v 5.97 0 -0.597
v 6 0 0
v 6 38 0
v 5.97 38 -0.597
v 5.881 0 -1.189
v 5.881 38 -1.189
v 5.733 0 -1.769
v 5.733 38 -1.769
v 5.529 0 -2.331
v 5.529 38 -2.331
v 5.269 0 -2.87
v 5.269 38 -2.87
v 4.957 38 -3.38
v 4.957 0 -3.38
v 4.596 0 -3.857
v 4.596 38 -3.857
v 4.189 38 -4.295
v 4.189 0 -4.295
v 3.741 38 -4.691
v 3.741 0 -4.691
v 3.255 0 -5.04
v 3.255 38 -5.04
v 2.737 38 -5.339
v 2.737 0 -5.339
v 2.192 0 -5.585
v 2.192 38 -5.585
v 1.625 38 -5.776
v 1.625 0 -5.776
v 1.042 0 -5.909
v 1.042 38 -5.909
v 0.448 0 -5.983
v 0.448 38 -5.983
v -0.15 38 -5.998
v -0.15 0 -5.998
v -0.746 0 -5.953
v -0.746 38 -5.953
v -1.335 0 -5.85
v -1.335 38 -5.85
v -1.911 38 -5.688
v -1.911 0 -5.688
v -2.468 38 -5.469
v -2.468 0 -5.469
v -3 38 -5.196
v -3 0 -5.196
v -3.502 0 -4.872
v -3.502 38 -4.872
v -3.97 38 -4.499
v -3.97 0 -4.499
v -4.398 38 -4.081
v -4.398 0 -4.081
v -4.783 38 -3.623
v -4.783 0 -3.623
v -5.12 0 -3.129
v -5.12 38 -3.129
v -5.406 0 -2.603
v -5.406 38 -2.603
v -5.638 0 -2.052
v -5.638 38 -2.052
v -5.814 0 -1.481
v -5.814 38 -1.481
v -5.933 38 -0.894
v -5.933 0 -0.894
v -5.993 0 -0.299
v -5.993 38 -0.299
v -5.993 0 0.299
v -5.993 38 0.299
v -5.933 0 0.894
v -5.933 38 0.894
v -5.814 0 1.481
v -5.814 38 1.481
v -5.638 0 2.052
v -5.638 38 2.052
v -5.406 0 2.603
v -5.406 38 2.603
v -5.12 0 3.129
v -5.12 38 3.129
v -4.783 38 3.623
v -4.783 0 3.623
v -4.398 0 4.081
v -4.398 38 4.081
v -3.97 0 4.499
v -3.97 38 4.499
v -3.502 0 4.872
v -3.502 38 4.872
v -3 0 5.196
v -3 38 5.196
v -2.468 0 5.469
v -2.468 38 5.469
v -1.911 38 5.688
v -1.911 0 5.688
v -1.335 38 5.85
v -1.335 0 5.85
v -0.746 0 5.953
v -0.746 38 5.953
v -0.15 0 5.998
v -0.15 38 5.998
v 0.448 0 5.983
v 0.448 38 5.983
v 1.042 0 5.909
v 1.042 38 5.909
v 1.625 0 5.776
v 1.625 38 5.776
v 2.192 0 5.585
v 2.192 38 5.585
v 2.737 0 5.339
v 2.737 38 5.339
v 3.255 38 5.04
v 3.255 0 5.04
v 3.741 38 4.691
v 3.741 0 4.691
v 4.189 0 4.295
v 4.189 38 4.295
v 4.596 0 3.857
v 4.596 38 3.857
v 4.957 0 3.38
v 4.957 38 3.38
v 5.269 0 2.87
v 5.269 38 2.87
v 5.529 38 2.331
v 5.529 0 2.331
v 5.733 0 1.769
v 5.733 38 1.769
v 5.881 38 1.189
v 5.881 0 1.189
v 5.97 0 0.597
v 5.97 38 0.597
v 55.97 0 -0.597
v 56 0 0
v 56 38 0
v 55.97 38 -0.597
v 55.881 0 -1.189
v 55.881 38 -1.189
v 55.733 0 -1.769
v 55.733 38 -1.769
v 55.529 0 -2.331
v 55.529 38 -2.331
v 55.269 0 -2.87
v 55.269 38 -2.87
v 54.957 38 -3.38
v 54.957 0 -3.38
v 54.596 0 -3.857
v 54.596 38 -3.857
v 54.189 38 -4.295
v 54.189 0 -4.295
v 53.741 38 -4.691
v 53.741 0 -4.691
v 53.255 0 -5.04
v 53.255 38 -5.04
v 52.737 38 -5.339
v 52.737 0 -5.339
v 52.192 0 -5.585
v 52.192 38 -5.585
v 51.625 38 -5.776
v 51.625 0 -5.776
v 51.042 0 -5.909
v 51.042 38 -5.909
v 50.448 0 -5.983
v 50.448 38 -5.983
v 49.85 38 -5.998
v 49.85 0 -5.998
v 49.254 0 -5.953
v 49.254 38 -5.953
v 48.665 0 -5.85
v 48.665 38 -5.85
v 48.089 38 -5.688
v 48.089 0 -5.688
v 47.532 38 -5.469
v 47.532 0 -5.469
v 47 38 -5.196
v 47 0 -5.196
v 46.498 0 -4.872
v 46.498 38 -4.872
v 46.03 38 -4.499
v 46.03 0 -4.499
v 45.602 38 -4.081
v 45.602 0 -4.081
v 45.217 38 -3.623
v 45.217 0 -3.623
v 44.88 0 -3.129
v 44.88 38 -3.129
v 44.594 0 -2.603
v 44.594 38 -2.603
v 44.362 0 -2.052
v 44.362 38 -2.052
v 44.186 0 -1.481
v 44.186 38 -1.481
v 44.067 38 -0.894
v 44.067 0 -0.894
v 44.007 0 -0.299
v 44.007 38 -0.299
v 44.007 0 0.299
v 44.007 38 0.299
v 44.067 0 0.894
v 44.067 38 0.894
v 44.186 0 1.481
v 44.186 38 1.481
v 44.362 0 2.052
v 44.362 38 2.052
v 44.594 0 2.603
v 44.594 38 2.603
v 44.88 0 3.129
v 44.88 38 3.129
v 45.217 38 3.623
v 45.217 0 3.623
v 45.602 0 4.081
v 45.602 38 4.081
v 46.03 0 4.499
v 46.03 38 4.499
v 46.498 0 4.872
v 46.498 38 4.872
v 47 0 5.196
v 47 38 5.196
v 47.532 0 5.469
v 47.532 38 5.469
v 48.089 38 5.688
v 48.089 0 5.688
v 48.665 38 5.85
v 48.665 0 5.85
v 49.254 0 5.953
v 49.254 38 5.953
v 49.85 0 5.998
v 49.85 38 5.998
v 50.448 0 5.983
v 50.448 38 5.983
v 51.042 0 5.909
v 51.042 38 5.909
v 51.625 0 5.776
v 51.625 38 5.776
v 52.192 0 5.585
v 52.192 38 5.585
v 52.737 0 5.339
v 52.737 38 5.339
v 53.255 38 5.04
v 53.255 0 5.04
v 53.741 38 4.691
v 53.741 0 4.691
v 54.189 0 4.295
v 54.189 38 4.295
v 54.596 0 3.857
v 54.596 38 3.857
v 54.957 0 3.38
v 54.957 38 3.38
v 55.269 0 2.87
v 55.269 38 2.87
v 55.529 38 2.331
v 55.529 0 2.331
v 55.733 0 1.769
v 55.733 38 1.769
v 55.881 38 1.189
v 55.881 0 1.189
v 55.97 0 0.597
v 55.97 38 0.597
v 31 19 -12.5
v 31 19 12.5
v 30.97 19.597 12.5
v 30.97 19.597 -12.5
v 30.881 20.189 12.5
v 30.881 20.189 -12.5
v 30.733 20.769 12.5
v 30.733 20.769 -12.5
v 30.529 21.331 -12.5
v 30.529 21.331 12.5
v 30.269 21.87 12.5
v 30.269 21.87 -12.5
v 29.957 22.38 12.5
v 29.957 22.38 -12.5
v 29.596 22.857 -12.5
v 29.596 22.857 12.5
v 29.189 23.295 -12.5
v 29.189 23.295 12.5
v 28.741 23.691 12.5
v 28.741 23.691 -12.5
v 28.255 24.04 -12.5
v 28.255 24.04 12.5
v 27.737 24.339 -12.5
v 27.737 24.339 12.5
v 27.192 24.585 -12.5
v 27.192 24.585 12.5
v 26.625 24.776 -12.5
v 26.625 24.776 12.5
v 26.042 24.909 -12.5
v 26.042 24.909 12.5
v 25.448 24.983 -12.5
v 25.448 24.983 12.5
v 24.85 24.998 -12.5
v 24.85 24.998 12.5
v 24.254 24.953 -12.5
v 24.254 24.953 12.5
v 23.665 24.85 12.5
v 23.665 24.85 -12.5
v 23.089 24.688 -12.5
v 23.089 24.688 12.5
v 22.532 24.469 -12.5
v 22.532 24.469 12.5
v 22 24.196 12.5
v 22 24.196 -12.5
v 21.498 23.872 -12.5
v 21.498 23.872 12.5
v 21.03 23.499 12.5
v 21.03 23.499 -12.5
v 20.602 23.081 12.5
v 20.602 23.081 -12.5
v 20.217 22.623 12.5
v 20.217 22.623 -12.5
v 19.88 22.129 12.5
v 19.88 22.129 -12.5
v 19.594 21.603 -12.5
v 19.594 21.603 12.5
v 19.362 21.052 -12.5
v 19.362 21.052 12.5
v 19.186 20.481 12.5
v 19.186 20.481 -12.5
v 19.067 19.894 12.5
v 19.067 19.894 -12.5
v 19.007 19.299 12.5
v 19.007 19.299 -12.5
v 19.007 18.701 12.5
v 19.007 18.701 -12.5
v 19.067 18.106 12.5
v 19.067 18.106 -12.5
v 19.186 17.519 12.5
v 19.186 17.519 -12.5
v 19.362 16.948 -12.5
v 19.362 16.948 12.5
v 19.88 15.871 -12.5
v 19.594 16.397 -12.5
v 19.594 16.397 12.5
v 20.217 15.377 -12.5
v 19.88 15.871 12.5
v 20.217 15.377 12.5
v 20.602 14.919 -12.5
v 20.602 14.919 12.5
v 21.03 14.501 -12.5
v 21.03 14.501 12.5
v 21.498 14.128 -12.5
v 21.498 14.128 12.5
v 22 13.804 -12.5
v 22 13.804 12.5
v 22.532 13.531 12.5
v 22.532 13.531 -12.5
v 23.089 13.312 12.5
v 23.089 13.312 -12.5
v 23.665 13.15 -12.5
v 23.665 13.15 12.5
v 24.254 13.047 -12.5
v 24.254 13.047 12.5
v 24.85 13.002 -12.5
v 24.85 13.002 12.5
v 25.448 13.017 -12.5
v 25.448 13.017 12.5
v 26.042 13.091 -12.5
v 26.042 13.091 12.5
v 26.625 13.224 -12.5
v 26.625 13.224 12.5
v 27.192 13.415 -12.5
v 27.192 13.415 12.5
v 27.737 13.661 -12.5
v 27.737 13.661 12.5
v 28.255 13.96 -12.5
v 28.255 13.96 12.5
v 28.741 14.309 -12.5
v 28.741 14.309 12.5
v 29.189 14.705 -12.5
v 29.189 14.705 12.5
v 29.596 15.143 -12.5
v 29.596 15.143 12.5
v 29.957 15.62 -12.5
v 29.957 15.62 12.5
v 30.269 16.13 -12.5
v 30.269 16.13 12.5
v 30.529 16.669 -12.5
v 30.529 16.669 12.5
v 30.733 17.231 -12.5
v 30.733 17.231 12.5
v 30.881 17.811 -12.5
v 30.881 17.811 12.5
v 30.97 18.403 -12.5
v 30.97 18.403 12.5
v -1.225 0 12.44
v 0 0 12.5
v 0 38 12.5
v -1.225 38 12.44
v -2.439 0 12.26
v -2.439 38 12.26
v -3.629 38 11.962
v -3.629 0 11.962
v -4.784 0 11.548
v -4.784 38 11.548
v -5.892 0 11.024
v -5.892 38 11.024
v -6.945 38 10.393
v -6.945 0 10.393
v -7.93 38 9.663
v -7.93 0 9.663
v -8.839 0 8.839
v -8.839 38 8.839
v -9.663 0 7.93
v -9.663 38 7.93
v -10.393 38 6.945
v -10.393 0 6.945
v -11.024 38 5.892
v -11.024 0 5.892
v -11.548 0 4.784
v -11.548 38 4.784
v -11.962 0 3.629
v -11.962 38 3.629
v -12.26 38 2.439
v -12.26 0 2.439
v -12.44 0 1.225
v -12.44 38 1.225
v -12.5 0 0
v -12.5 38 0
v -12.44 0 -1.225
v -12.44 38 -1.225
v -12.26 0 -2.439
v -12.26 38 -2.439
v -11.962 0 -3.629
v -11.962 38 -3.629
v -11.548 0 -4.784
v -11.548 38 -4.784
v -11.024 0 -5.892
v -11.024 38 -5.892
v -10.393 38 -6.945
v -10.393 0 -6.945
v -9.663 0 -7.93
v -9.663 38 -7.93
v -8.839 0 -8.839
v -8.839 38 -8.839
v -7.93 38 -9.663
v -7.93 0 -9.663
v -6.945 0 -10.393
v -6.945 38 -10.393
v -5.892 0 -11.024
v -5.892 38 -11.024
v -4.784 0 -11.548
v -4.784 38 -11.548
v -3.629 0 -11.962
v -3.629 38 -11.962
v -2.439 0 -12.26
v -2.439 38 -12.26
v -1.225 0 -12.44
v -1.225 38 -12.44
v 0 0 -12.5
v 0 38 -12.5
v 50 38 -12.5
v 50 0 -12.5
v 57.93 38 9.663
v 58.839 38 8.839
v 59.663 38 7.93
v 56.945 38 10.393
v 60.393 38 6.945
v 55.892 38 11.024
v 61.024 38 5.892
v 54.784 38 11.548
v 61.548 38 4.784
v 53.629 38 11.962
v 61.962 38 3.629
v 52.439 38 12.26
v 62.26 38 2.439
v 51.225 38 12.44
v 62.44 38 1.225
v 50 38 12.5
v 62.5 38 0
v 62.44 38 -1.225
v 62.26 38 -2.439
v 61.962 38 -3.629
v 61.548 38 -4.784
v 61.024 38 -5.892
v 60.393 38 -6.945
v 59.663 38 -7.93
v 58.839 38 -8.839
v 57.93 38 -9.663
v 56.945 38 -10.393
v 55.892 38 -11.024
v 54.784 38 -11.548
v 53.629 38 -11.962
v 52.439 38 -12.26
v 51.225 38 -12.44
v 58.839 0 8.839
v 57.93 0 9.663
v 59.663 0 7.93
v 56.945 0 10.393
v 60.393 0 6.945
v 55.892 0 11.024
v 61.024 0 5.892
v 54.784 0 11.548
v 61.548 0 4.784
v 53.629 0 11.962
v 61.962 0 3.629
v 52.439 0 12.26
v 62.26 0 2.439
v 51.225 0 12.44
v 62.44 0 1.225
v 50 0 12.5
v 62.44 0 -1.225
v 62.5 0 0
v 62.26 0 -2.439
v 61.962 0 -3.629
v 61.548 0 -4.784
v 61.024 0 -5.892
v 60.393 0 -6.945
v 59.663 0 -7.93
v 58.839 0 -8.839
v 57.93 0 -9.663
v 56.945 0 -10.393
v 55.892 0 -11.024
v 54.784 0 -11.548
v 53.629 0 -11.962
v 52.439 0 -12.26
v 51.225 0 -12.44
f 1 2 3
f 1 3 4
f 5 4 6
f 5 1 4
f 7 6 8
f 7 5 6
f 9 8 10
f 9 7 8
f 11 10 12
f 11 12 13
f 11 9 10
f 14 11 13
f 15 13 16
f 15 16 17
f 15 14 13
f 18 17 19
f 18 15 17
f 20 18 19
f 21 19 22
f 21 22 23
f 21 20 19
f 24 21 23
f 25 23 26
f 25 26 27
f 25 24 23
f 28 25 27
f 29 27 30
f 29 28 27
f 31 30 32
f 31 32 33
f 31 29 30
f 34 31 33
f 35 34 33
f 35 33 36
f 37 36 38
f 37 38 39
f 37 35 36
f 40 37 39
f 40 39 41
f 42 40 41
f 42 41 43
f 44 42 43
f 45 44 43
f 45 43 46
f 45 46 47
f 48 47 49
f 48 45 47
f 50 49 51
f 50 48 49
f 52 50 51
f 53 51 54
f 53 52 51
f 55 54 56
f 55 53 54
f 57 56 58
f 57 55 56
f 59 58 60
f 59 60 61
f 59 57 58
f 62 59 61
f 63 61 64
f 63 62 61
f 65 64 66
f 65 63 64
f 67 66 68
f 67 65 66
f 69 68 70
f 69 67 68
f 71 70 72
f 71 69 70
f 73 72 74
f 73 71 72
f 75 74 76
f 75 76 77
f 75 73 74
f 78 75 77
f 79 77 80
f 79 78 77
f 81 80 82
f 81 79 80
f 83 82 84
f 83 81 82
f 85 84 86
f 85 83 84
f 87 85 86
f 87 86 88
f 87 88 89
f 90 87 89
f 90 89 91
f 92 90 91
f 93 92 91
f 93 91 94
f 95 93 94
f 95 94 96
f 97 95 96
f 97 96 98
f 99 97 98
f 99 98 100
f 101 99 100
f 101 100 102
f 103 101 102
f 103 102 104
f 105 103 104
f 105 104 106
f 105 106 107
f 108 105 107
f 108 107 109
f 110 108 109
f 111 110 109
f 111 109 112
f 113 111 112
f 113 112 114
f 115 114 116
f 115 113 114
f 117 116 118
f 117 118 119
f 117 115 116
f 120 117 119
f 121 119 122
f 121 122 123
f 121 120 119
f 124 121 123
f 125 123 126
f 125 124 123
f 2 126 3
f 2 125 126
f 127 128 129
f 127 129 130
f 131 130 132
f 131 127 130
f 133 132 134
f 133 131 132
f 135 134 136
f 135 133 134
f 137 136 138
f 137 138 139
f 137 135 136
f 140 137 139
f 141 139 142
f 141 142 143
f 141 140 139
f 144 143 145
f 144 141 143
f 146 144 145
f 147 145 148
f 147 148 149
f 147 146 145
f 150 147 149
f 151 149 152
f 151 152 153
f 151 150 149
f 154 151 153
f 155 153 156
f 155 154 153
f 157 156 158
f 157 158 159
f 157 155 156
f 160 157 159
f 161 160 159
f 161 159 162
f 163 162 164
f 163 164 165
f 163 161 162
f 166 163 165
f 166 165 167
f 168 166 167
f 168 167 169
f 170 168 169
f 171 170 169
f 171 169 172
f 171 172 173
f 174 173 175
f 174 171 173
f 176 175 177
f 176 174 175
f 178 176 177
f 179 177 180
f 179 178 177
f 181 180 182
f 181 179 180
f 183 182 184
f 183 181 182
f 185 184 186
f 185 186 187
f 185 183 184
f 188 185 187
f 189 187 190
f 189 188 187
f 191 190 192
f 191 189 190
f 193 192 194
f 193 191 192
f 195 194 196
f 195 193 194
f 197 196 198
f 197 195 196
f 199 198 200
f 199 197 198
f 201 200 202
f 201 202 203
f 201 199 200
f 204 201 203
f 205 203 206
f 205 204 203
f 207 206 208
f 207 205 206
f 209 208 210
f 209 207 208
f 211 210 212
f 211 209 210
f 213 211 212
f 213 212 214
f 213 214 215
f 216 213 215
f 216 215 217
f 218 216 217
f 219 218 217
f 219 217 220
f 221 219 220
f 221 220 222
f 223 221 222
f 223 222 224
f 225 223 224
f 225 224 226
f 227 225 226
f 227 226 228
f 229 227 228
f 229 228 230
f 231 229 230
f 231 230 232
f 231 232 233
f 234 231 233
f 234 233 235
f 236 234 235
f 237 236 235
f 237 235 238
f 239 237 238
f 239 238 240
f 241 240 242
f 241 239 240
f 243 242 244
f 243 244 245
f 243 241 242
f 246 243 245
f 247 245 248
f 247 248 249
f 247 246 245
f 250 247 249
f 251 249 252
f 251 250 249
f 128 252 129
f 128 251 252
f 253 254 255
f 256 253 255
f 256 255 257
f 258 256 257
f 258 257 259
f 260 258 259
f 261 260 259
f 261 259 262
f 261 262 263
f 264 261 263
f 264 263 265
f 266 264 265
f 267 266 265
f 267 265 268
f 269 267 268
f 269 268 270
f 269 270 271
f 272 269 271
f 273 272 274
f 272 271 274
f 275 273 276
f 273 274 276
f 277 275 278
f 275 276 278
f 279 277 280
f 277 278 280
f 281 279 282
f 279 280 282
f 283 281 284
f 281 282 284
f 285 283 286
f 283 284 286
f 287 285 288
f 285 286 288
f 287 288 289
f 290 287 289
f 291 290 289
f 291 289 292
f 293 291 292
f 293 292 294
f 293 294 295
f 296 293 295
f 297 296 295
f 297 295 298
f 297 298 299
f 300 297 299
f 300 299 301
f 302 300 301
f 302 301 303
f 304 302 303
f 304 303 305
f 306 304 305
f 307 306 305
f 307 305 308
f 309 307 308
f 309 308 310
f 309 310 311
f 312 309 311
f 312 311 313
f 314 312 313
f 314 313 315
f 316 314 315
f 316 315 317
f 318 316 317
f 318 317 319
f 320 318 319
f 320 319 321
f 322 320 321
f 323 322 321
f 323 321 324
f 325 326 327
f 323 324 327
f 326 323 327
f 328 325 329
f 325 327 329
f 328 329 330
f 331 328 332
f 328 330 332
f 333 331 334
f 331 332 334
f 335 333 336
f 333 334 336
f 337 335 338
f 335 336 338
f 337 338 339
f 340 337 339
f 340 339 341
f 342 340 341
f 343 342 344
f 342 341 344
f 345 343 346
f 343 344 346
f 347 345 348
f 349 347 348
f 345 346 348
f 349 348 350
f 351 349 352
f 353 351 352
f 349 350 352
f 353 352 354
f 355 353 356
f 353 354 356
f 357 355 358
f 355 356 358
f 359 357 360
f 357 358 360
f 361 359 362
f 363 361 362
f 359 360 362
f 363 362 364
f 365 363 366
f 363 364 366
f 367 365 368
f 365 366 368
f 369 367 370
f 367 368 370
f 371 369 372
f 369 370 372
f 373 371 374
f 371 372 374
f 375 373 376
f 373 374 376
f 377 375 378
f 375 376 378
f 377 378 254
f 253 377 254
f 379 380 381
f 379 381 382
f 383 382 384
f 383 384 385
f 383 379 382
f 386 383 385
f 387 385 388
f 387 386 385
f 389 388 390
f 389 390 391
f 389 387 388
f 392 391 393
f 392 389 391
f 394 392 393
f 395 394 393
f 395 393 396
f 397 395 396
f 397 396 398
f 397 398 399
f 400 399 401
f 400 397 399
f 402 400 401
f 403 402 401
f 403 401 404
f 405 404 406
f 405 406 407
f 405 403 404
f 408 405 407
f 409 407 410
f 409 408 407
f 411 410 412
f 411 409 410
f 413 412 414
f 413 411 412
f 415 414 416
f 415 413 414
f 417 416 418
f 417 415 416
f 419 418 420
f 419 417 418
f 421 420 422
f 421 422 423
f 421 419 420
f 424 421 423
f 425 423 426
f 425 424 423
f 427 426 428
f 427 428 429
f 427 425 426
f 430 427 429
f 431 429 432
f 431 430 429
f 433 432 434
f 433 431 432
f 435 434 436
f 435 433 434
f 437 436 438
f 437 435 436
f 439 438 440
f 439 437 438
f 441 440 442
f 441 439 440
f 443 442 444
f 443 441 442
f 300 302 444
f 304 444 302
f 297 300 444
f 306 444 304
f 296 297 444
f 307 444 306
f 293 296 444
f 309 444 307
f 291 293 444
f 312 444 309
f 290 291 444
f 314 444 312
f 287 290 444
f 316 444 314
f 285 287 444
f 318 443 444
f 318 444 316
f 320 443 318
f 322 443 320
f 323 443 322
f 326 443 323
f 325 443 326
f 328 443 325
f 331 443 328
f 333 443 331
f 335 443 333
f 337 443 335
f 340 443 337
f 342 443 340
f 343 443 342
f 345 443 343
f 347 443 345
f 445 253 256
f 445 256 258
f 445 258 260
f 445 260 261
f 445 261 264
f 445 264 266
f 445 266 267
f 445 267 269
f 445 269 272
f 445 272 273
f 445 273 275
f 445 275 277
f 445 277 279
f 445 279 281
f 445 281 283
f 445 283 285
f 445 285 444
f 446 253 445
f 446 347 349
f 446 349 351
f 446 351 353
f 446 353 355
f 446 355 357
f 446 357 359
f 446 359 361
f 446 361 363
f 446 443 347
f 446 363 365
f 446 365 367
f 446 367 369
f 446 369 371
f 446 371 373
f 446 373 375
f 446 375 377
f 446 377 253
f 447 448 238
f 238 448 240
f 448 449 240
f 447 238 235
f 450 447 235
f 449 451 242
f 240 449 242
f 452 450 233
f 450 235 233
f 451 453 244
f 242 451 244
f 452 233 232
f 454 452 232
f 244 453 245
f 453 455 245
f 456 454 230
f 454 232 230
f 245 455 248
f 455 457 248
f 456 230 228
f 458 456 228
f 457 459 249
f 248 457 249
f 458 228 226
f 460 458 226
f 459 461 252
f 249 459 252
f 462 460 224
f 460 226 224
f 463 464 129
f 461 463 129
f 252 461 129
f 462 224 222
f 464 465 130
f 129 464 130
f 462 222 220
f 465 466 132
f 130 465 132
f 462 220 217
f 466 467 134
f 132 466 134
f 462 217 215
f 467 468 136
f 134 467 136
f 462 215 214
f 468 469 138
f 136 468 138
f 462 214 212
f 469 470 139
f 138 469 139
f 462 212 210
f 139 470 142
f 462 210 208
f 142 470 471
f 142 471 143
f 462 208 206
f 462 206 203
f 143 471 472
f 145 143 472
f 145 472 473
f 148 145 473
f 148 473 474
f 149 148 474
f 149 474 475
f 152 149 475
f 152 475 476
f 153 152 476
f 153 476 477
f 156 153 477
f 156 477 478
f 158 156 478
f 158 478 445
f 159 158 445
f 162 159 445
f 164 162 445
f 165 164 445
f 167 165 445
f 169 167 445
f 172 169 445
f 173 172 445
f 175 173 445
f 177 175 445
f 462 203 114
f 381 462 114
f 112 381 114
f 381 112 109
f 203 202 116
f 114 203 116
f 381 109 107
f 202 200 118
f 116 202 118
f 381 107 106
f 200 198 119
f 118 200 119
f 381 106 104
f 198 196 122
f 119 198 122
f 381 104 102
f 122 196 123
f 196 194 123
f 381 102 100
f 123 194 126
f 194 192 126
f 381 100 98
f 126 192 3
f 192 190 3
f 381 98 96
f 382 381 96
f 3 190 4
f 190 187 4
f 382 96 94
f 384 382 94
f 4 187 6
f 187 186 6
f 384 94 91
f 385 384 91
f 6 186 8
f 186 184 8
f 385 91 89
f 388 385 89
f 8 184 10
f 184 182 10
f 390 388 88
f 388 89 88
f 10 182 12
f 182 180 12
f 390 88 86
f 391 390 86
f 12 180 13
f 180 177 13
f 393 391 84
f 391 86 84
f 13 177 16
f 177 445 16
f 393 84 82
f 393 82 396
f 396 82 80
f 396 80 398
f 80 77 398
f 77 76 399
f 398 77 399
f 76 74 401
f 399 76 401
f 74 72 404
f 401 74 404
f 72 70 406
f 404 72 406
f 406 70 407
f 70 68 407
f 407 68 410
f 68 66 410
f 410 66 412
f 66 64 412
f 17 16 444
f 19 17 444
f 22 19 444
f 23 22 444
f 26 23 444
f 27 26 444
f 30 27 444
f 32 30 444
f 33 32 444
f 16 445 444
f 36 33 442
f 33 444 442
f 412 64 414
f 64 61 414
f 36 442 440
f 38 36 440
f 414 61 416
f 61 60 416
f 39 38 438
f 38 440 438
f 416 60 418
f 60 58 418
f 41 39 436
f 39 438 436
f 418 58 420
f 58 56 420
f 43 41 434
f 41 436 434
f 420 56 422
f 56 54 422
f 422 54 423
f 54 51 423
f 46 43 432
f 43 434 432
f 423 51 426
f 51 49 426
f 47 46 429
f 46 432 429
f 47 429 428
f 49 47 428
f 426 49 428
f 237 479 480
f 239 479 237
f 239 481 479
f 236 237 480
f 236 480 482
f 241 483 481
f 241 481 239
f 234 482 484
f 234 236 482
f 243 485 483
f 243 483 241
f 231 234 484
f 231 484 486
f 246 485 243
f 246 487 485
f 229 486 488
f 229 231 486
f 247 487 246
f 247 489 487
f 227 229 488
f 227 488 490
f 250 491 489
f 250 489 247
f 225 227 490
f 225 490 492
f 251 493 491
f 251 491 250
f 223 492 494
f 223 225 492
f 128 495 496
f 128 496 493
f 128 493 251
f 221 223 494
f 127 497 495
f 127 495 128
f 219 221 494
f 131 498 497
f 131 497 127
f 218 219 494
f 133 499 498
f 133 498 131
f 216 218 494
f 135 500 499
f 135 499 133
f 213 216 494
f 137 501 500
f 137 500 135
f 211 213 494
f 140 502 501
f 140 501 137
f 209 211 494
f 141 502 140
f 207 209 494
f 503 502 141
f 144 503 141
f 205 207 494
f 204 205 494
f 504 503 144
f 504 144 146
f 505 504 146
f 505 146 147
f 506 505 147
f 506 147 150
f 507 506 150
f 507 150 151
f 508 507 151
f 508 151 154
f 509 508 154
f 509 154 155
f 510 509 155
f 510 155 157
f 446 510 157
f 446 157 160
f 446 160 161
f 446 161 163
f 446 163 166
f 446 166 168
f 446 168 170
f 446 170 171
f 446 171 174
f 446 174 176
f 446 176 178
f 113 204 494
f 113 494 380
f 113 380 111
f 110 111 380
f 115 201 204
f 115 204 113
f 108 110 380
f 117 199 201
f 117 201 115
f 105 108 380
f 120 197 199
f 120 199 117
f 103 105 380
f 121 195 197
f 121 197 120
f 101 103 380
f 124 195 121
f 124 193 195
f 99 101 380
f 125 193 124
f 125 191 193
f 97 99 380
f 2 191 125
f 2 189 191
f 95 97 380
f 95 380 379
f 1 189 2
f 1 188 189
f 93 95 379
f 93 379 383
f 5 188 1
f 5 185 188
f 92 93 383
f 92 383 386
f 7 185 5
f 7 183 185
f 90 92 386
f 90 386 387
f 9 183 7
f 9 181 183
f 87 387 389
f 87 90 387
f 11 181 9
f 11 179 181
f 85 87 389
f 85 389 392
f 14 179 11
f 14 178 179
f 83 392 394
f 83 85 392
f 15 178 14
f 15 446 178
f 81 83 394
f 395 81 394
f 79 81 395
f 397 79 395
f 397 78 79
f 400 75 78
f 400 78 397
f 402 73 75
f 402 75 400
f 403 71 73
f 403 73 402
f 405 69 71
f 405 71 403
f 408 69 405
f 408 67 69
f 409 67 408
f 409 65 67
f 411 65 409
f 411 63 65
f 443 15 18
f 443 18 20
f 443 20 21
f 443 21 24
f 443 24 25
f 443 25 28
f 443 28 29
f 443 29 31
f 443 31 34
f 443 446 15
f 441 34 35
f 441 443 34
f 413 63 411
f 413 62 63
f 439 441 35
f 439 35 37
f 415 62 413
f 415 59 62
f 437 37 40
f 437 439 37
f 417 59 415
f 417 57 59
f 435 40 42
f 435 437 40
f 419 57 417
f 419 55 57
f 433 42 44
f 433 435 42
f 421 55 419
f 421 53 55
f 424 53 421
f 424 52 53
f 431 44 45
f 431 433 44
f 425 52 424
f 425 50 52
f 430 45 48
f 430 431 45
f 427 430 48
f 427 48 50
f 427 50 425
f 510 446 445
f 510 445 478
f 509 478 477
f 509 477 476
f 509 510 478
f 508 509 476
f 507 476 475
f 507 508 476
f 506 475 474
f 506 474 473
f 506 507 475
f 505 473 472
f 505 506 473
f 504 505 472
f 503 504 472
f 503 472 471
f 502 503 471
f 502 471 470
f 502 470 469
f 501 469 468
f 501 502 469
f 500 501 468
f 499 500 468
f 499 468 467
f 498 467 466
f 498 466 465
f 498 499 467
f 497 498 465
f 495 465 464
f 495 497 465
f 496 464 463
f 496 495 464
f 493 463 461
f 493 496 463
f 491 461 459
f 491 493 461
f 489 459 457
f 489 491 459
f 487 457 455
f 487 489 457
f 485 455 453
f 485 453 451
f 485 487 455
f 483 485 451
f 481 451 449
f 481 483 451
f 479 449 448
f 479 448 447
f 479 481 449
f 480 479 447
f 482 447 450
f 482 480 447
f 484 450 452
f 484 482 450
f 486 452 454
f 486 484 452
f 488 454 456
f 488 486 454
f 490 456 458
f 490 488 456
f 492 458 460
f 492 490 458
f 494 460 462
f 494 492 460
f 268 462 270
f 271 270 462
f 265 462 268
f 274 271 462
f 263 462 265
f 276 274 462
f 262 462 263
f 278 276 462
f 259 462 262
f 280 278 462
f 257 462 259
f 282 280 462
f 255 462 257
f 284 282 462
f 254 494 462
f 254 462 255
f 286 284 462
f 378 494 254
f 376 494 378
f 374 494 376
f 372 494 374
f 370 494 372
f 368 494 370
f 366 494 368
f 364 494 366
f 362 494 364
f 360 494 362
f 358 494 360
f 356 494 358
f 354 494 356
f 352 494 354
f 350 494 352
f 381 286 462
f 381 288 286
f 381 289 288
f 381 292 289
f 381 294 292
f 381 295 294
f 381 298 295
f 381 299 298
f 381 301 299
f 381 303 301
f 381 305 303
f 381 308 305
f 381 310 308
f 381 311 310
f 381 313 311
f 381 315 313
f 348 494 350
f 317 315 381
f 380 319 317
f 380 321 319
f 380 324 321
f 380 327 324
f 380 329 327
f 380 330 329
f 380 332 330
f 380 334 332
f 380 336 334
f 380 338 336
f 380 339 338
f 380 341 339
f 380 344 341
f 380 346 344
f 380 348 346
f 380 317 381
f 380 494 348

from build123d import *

# Parameters (mm, degrees)
SKETCH1_R           = 6
BOSS_EXTRUDE1_DEPTH = 38
SKETCH3_R           = 6
CUT_EXTRUDE1_DEPTH  = 38


with BuildPart() as part:
    # Sketch1 → Boss-Extrude1 (new body)
    with BuildSketch(Plane(origin=(0, 0, 0), x_dir=(1, 0, 0), z_dir=(0, 1, 0))):
        with BuildLine():
            Line((0, 12.5), (50, 12.5))
            ThreePointArc((50, 12.5), (62.5, 0), (50, -12.5))
            Line((50, -12.5), (0, -12.5))
            ThreePointArc((0, -12.5), (-12.5, 0), (0, 12.5))
        make_face()
        Circle(SKETCH1_R, mode=Mode.SUBTRACT)
        with Locations((50, 0)):
            Circle(SKETCH1_R, mode=Mode.SUBTRACT)
    extrude(amount=BOSS_EXTRUDE1_DEPTH)

    # Sketch3 → Cut-Extrude1 (cut)
    with BuildSketch(Plane.XY.offset(12.5)):
        with Locations((25, 19)):
            Circle(SKETCH3_R)
    extrude(amount=-CUT_EXTRUDE1_DEPTH, mode=Mode.SUBTRACT)


solid = part.part
